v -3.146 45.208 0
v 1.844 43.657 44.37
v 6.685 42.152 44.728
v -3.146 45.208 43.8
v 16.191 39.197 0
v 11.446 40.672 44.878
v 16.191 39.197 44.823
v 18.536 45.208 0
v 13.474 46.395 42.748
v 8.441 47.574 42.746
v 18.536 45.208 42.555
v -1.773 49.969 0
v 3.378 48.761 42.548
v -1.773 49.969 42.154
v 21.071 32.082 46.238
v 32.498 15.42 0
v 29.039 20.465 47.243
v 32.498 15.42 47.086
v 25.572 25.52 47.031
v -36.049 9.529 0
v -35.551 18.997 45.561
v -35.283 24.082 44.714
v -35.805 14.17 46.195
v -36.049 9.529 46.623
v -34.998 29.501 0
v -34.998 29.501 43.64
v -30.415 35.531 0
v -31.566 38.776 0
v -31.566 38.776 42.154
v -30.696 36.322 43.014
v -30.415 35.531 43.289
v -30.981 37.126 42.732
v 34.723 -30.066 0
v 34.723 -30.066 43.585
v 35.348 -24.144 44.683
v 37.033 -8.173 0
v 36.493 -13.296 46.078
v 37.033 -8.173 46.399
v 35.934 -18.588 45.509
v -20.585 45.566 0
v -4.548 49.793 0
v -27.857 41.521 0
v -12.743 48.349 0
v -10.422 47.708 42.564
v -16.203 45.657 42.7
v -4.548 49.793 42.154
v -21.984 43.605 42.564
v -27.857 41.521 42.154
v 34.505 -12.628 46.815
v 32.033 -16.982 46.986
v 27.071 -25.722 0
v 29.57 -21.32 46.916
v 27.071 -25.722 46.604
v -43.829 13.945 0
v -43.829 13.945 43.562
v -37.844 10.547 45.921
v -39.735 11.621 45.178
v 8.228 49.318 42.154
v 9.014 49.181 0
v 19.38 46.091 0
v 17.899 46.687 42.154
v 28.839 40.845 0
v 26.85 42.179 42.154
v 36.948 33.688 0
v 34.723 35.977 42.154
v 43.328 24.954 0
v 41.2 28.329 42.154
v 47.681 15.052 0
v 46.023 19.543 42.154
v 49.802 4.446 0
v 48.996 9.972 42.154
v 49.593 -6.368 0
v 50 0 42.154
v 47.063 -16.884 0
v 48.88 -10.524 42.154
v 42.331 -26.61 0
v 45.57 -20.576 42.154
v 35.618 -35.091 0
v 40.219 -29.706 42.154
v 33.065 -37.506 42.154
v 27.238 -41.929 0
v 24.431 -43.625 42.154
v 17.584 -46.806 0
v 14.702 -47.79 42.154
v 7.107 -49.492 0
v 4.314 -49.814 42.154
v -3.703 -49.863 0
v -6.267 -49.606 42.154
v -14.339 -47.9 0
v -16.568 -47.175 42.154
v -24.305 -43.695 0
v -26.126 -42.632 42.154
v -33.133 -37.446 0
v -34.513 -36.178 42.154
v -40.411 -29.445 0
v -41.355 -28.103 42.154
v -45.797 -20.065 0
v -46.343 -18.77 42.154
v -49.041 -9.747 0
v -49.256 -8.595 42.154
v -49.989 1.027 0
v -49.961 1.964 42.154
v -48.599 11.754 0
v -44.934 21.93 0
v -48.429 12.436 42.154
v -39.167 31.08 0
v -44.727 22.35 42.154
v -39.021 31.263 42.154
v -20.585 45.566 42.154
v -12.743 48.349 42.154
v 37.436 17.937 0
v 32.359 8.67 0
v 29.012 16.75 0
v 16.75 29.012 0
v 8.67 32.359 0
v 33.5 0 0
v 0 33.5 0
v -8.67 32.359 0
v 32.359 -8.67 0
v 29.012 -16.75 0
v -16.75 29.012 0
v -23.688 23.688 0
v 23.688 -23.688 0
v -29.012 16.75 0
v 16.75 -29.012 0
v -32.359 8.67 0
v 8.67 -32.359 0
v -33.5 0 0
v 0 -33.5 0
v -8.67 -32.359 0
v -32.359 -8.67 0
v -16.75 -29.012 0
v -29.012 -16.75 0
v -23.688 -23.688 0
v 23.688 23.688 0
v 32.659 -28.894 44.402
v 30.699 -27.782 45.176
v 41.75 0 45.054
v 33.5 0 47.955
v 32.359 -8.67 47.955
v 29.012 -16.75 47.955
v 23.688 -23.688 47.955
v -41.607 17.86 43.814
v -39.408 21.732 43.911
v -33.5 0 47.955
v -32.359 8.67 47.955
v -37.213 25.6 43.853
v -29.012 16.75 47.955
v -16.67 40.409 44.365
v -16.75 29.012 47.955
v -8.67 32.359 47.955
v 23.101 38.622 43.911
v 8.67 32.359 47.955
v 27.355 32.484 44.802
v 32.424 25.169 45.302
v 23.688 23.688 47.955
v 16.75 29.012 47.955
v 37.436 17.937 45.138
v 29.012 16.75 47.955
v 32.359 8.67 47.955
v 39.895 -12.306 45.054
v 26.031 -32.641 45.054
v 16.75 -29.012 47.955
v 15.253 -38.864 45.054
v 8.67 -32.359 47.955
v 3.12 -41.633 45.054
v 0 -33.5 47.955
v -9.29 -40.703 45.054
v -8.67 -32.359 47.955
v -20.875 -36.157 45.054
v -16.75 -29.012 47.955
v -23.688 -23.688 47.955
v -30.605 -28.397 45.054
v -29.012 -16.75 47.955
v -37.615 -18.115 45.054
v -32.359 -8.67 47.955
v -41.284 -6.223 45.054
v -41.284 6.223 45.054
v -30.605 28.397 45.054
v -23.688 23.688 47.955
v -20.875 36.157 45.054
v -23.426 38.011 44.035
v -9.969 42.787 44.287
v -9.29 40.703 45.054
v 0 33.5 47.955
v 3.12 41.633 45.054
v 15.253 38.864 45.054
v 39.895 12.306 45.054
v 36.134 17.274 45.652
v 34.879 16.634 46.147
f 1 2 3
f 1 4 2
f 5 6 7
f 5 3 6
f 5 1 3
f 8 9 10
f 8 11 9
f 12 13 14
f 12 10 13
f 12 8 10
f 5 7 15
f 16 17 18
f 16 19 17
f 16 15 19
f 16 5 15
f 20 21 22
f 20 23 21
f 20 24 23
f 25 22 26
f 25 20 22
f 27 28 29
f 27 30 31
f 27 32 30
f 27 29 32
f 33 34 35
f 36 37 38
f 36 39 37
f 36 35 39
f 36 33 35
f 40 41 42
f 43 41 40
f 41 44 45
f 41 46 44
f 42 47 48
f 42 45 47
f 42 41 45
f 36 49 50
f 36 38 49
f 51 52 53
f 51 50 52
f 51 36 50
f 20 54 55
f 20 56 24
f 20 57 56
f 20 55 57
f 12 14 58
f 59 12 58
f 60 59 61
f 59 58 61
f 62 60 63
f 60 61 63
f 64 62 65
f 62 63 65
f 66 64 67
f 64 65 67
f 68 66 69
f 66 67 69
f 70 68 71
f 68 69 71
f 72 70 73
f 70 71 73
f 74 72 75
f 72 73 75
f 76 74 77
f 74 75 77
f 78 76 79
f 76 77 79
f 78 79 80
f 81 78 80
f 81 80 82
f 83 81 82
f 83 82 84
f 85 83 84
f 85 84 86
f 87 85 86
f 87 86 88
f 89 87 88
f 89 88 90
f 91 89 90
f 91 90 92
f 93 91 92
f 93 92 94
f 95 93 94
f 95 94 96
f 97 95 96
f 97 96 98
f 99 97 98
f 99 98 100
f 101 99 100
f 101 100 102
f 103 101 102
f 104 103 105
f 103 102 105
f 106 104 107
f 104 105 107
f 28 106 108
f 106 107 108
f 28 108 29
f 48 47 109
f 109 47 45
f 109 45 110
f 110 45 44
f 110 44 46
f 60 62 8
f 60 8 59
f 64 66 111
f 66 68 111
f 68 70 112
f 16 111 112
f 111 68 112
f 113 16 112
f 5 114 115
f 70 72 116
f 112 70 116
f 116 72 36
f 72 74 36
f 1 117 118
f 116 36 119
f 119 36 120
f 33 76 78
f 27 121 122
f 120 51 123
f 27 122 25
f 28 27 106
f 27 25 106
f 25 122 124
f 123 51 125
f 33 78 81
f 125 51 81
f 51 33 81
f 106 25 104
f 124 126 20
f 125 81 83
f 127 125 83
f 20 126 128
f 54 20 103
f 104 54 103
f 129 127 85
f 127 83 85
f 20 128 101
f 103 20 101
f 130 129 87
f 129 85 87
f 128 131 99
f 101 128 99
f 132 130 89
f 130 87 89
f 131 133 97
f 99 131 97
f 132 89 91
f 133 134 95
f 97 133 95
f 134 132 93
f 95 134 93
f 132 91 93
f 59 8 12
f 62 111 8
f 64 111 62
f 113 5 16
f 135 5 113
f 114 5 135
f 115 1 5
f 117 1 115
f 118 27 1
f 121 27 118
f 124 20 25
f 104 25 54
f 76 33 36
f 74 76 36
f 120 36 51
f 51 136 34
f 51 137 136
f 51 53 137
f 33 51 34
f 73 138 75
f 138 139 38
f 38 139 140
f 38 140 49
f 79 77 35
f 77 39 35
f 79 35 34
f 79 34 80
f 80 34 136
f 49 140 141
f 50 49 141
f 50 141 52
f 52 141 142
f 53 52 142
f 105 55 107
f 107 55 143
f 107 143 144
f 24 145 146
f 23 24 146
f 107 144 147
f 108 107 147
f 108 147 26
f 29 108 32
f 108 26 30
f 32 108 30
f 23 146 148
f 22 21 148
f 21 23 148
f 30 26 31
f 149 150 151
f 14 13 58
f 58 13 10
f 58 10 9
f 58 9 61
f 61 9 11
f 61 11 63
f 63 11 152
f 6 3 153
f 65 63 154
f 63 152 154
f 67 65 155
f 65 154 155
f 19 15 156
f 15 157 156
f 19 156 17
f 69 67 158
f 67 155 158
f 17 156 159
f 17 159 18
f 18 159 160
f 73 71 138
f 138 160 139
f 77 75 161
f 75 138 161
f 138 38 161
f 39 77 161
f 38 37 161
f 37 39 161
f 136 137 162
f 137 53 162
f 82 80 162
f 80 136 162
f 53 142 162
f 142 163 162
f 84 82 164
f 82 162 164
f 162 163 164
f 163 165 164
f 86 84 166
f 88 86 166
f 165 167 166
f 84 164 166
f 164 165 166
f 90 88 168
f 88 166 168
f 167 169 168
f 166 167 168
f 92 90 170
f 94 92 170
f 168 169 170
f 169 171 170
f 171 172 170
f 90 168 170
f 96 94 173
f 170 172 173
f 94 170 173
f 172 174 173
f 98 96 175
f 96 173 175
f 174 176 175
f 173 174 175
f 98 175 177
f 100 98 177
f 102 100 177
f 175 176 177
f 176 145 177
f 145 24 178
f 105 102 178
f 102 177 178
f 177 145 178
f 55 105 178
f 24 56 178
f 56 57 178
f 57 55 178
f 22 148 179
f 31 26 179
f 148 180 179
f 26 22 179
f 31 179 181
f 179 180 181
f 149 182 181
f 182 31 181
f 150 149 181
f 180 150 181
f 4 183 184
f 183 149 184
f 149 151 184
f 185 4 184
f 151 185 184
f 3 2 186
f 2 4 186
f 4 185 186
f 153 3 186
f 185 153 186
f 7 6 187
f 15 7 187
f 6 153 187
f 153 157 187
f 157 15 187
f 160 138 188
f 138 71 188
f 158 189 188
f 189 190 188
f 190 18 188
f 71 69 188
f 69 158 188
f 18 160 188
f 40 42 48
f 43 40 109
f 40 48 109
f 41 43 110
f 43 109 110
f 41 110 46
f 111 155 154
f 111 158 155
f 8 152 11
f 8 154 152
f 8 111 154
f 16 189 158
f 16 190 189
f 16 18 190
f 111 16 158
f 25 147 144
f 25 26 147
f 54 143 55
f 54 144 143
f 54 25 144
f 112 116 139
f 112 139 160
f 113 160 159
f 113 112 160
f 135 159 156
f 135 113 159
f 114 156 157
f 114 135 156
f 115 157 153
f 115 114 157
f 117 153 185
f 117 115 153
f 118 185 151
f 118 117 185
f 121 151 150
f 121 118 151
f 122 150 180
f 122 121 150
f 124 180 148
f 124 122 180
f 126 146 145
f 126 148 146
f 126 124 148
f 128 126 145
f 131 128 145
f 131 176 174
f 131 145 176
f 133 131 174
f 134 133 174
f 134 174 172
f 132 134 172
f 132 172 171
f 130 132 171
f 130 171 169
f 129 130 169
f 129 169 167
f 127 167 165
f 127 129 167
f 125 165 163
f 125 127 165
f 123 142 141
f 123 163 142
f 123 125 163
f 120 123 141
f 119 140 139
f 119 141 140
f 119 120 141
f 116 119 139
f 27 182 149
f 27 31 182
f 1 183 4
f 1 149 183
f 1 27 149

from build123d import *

# Parameters (mm, degrees)
F2_R     = 33.5
F3_DEPTH = 60.3
F5_DEPTH = 185.2
F7_DEPTH = 513.9


with BuildPart() as f1:
    # F0 (on Front) → F1 (revolve)
    with BuildSketch(Plane.XZ):
        Polygon((0, 59.732436), (0, 0), (50, 0), (50, 42.15404), align=None)
    revolve(axis=Axis((0, 0, 30.367568), (0, 0, -1)))

    # F2 (on Top) → F3 (cut)
    with BuildSketch(Plane.XY):
        Circle(F2_R)
    extrude(amount=F3_DEPTH, mode=Mode.SUBTRACT)

    # F4 (on Top) → F5 (cut)
    with BuildSketch(Plane.XY):
        Polygon((34.722967, -30.066082), (37.033275, -8.173317), (27.071127, -25.722313), align=None)
        Polygon((-36.049124, 9.528592), (-34.998236, 29.500964), (-43.828972, 13.945027), align=None)
    extrude(amount=F5_DEPTH, mode=Mode.SUBTRACT)

    # F6 (on Top) → F7 (cut)
    with BuildSketch(Plane.XY):
        Polygon((16.191127, 39.197367), (32.498192, 15.420348), (37.43574, 17.937383), (18.53629, 45.208145), (-3.14586, 50.290386), (-32.016785, 40.044539), (-30.41492, 35.530776), (-3.14586, 45.208145), align=None)
    extrude(amount=F7_DEPTH, mode=Mode.SUBTRACT)


solid = f1.part
